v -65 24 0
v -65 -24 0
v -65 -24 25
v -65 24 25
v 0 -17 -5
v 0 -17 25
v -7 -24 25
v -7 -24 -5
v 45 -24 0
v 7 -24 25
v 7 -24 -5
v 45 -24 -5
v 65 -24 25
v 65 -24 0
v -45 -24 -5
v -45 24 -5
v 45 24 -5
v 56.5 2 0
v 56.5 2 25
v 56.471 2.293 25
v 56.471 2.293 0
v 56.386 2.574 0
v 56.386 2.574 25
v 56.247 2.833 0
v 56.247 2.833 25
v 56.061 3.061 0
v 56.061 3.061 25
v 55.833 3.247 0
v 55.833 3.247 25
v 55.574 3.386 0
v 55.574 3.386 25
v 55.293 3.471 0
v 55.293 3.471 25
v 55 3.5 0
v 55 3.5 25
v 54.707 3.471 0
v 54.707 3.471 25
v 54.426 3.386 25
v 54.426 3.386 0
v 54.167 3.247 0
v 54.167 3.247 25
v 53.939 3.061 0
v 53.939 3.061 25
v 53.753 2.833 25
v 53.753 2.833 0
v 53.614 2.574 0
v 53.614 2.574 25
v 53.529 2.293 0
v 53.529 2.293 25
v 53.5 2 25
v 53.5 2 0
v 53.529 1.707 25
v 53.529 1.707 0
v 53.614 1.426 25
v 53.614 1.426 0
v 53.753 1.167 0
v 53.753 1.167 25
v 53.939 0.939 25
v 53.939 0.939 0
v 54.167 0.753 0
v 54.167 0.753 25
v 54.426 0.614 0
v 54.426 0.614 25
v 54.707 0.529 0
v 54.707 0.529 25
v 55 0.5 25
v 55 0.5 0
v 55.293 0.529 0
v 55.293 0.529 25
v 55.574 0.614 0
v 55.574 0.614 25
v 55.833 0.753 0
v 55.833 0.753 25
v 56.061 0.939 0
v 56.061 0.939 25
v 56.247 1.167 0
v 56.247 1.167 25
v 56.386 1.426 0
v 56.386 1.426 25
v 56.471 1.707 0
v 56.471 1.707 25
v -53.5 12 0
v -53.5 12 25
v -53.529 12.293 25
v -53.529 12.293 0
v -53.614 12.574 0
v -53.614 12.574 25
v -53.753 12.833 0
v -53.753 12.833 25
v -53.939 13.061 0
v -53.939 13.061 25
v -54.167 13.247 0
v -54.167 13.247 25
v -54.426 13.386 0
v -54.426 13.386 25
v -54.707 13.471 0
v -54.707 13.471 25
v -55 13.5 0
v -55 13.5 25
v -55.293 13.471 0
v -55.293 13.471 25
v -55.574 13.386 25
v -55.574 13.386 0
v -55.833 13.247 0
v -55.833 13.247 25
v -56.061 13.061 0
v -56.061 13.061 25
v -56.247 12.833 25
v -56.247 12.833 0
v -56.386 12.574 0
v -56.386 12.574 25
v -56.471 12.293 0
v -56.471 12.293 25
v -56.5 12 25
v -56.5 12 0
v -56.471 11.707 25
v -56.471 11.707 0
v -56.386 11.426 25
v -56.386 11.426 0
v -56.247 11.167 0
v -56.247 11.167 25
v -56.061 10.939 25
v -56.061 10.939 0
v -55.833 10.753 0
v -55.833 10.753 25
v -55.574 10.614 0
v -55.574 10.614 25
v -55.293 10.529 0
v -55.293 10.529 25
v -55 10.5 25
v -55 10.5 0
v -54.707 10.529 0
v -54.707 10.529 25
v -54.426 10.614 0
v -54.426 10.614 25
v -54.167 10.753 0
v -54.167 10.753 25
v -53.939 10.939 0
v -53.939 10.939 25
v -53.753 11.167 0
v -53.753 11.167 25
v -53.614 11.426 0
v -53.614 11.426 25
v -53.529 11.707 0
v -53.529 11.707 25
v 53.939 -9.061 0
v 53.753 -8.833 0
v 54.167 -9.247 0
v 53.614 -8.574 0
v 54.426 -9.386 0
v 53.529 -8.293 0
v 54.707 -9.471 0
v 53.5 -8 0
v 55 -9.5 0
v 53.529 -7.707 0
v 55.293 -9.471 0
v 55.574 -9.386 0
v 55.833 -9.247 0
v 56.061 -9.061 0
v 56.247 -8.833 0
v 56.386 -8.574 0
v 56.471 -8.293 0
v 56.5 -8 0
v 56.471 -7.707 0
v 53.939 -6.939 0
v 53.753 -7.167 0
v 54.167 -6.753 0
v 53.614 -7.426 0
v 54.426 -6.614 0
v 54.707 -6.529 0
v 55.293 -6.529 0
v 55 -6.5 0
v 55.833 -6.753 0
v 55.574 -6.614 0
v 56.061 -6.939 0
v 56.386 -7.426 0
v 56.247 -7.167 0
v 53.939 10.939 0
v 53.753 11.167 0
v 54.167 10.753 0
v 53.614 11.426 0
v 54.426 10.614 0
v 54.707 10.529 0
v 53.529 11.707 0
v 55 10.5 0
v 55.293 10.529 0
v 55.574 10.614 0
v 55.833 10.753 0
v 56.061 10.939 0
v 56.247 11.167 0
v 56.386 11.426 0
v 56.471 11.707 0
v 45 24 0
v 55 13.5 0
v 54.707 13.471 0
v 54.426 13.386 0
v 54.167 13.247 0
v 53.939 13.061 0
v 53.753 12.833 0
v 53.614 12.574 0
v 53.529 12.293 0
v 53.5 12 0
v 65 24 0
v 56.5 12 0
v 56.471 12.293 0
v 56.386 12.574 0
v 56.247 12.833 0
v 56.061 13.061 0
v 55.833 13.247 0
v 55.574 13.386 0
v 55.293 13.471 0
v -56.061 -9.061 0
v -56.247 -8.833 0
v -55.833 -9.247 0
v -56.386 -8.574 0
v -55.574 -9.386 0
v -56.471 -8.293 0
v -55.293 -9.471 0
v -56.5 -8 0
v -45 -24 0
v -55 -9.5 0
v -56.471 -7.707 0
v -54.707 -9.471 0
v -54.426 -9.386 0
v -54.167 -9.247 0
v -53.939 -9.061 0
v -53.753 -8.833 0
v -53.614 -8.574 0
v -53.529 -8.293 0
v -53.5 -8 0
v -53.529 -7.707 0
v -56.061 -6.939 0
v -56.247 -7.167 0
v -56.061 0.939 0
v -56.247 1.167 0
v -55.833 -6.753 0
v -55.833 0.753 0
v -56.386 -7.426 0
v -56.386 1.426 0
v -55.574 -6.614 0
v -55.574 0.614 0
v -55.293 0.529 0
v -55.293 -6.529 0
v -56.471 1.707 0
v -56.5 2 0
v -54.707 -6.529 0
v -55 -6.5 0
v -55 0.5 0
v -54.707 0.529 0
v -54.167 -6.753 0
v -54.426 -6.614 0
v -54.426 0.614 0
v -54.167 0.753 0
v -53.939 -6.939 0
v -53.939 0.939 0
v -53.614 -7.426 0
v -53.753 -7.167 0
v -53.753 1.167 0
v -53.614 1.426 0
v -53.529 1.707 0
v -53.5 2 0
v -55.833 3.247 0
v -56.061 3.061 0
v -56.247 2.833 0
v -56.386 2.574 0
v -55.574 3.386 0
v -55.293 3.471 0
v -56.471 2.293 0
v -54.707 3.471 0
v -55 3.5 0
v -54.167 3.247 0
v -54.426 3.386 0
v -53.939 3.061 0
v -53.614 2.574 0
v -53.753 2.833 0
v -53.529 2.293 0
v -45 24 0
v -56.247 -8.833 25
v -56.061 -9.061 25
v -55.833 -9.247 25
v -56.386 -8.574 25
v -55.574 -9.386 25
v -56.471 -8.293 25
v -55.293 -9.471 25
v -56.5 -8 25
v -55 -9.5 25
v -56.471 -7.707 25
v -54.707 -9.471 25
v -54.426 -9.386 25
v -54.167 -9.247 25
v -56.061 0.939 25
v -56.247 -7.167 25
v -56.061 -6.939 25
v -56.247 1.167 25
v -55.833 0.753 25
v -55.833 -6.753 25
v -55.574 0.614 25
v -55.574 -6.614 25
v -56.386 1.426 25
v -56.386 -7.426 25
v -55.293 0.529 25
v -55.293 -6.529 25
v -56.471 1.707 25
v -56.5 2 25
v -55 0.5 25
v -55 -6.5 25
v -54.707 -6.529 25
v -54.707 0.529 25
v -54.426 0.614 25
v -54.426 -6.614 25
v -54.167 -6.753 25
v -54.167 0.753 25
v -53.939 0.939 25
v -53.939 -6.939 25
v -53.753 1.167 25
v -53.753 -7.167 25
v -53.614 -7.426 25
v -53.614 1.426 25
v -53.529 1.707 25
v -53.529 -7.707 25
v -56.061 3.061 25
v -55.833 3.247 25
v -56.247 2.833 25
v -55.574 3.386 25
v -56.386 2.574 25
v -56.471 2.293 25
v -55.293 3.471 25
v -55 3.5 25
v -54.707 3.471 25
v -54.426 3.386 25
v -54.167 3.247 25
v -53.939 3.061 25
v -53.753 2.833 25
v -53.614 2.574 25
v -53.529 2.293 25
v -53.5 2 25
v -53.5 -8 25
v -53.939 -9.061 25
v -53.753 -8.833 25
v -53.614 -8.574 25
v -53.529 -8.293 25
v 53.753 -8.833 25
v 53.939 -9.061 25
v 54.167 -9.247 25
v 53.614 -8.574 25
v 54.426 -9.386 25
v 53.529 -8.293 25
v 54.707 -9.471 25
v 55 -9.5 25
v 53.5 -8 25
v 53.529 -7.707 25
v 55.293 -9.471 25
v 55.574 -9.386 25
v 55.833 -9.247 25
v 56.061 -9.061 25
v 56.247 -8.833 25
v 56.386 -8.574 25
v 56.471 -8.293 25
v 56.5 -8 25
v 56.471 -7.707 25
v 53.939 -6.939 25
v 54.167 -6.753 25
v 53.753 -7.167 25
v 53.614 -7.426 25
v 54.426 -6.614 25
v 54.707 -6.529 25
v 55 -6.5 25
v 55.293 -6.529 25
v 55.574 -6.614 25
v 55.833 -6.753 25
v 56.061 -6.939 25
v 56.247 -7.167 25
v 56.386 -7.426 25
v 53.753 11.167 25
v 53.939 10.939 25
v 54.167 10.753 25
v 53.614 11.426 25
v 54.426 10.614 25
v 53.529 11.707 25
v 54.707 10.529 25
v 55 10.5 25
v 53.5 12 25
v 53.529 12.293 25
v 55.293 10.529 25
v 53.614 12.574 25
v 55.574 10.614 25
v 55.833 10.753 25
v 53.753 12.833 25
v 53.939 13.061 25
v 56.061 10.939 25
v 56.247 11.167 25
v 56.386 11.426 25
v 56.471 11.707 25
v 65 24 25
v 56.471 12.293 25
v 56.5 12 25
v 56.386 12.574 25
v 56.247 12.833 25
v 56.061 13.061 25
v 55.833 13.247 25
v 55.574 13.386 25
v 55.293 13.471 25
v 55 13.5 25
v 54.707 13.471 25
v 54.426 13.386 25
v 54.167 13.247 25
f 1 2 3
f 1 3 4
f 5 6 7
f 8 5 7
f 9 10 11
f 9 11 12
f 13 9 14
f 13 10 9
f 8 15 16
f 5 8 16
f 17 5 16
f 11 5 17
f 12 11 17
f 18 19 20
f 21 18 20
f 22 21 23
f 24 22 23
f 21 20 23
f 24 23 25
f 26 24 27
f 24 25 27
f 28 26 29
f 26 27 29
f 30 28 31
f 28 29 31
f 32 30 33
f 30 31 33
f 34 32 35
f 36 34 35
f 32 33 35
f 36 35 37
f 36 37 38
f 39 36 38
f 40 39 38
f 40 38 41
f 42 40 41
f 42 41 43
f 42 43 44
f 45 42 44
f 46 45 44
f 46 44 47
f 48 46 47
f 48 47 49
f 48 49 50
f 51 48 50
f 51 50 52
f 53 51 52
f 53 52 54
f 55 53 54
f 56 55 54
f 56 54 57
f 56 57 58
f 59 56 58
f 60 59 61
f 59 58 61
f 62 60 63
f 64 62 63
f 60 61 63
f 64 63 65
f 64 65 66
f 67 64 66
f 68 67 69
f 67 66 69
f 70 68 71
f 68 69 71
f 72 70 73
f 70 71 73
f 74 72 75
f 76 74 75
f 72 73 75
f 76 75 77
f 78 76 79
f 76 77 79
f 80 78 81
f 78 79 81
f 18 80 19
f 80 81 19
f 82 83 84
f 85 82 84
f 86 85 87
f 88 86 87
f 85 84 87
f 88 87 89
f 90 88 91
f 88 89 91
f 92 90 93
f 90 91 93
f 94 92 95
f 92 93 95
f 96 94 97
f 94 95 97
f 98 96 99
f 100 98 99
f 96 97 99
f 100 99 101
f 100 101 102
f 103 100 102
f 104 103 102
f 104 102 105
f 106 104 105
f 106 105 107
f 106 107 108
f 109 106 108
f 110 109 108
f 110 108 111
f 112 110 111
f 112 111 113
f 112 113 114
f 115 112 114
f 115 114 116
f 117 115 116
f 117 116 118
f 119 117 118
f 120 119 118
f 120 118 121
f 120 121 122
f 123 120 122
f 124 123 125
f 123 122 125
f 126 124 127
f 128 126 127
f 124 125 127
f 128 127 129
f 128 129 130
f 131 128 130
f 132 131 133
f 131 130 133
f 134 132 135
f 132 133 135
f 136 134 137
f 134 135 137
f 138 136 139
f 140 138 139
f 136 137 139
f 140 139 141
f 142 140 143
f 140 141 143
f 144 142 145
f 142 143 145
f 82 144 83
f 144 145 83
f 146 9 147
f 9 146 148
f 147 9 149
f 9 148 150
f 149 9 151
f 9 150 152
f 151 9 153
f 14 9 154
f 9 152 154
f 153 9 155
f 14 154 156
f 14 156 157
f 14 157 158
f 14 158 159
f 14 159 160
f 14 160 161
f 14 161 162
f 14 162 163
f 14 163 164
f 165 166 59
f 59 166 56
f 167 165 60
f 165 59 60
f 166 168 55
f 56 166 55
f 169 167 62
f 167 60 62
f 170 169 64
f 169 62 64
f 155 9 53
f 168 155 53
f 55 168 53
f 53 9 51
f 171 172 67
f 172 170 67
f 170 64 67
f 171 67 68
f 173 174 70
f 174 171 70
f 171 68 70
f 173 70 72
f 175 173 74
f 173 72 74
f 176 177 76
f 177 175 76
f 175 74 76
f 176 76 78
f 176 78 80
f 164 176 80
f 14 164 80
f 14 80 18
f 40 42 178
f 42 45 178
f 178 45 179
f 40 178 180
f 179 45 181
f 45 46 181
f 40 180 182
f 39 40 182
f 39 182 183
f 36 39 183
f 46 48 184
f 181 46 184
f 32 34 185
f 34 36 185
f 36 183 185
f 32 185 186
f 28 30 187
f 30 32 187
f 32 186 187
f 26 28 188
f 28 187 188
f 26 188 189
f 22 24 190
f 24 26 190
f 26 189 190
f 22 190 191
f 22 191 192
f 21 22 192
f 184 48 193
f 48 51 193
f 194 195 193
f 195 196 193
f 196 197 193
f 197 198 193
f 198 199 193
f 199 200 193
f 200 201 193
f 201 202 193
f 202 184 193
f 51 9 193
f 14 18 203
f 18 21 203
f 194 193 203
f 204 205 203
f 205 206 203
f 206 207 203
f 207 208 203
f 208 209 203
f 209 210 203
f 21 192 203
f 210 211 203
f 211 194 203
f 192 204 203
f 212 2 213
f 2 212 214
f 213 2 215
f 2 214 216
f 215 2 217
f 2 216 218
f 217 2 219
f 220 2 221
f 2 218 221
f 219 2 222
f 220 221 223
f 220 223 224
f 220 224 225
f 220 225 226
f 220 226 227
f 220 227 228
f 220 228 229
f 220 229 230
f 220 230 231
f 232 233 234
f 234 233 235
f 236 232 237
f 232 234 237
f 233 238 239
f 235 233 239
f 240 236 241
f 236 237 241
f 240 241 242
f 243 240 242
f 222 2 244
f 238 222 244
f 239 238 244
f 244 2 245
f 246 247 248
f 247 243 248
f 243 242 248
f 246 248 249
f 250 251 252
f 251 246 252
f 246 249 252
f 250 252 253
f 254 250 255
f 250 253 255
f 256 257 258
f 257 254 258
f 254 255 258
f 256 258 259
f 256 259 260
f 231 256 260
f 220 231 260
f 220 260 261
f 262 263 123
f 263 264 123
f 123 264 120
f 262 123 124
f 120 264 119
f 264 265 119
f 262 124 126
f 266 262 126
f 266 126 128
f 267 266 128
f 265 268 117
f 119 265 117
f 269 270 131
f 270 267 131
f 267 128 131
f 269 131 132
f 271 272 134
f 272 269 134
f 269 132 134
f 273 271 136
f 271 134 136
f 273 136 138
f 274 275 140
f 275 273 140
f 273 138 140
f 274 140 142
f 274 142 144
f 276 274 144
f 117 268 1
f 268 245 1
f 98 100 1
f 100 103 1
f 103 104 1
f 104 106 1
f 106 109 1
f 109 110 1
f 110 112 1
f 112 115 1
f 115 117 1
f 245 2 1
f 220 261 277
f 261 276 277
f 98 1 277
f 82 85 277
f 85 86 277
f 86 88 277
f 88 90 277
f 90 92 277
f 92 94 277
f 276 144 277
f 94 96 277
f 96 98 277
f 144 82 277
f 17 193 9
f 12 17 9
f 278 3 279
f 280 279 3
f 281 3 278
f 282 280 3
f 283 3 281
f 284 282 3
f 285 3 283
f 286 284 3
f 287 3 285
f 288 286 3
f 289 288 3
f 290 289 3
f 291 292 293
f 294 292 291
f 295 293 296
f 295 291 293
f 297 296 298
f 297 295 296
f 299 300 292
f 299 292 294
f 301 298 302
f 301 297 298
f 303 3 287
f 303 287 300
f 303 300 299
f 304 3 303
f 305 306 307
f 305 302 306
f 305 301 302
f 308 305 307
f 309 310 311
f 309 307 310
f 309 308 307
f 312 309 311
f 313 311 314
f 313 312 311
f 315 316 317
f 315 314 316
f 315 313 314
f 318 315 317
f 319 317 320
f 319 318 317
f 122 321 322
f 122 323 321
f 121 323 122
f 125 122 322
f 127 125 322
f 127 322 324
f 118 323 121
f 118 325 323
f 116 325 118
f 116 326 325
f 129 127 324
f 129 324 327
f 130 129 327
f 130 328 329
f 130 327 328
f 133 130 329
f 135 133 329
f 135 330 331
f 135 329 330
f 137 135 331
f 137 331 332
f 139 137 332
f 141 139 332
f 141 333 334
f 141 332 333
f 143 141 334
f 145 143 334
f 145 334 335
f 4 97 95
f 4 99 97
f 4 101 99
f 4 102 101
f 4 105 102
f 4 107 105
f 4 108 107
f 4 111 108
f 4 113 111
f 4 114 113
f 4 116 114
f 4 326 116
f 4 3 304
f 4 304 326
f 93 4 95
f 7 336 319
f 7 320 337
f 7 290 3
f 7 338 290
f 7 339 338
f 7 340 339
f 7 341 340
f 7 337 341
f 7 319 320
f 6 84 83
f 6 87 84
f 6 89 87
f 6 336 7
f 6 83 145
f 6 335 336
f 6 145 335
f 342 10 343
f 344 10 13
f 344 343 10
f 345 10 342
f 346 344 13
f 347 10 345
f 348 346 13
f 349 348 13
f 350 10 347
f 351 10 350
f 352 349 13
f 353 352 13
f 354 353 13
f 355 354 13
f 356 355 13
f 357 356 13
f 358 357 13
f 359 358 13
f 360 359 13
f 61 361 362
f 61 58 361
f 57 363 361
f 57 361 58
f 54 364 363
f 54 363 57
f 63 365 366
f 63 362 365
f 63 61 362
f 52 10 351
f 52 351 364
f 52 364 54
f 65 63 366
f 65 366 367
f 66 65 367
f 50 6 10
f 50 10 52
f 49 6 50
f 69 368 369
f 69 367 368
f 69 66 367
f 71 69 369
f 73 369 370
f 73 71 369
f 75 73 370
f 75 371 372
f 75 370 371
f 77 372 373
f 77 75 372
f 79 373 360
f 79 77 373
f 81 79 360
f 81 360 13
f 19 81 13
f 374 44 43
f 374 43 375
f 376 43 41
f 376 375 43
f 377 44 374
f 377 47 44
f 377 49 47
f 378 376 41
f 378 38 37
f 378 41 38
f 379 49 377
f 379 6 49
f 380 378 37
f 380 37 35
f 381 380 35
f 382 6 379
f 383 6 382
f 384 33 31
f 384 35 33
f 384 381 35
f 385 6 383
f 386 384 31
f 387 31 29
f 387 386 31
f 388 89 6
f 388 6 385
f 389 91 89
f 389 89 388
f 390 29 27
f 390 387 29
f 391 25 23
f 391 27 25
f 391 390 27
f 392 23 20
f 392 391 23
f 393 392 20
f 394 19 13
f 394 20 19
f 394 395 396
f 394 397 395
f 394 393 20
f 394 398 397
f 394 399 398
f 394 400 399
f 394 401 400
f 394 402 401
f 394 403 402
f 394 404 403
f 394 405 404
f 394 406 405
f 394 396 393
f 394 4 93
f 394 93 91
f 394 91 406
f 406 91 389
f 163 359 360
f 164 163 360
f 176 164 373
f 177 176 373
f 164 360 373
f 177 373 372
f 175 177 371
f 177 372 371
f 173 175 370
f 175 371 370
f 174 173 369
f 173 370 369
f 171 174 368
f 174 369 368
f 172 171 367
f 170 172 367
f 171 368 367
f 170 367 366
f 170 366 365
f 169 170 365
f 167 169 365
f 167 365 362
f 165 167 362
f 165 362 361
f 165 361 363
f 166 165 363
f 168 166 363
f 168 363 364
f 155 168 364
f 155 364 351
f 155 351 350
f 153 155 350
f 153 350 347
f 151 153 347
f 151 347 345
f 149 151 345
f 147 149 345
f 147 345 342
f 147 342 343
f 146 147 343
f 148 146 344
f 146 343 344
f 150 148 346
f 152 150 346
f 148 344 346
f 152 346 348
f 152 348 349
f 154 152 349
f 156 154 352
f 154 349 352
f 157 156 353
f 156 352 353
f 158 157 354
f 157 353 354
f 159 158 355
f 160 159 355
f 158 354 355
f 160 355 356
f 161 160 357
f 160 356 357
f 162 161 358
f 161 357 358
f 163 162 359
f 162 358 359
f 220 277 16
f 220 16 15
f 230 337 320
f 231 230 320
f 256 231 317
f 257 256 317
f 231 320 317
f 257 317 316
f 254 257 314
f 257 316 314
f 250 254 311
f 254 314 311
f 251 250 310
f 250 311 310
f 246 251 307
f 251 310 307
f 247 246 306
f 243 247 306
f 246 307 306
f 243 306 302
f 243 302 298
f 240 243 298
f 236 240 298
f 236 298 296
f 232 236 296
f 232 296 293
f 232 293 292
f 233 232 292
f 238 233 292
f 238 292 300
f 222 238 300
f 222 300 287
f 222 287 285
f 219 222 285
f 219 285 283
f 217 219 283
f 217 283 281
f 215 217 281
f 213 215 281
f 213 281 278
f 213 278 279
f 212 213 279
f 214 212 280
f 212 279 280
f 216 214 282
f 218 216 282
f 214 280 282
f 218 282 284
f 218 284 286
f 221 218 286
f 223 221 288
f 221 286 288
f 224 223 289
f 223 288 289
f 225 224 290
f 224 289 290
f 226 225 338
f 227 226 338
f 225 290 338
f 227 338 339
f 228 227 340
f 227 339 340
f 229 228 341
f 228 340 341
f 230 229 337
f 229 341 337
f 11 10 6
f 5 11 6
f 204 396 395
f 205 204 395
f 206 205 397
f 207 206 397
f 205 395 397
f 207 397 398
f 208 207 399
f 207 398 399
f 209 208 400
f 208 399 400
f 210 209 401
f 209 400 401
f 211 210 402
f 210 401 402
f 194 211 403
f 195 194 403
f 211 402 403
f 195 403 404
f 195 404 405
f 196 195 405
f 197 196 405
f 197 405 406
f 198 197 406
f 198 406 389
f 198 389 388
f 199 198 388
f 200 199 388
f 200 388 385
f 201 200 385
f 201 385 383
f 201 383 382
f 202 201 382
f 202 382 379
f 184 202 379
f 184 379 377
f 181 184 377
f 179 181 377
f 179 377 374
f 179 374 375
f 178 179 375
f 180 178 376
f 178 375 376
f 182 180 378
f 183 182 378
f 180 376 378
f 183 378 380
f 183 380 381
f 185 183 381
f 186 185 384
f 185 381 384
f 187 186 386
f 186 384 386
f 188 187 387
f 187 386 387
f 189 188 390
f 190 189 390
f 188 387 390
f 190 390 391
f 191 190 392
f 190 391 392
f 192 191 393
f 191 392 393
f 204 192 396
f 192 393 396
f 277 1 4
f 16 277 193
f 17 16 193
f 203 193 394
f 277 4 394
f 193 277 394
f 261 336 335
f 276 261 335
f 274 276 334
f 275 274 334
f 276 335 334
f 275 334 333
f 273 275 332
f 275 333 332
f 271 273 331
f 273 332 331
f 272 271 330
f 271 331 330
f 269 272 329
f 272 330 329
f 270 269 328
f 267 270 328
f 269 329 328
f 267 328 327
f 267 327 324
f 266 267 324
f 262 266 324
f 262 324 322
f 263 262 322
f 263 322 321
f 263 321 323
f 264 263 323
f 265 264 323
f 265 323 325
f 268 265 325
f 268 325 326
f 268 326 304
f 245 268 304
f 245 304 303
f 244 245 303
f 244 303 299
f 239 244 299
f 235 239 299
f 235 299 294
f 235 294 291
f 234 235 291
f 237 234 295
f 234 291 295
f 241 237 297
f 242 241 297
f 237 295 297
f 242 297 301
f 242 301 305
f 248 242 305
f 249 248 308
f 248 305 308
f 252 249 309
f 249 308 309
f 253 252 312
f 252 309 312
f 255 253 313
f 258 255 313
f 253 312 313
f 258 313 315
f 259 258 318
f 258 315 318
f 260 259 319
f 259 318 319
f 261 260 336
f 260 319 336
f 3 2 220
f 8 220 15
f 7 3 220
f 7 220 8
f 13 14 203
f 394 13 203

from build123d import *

# Parameters (mm, degrees)
F0_W     = 130
F0_H     = 48
F1_DEPTH = 25
F3_DEPTH = 25.001
F4_R     = 1.5
F5_DEPTH = 25.001
F6_W     = 90
F6_H     = 48
F7_DEPTH = 5
F8_DEPTH = 25


with BuildPart() as f1:
    # F0 (on Top) → F1 (new body)
    with BuildSketch(Plane.XY):
        Rectangle(F0_W, F0_H)
    extrude(amount=F1_DEPTH)

    # F2 (on face) → F3 (cut, through all)
    with BuildSketch(Plane.XY.offset(25)):
        Polygon((7, -24), (0, -17), (-7, -24), align=None)
    extrude(amount=-F3_DEPTH, mode=Mode.SUBTRACT)

    # F4 (on face) → F5 (cut, through all)
    with BuildSketch(Plane.XY.offset(25)):
        with Locations((-55, 12)):
            Circle(F4_R)
        with Locations((-55, 2)):
            Circle(F4_R)
        with Locations((-55, -8)):
            Circle(F4_R)
        with Locations((55, 12)):
            Circle(F4_R)
        with Locations((55, 2)):
            Circle(F4_R)
        with Locations((55, -8)):
            Circle(F4_R)
    extrude(amount=-F5_DEPTH, mode=Mode.SUBTRACT)

    # F6 (on face) → F7 (join)
    with BuildSketch(Plane(origin=(0, 0, 0), x_dir=(1, 0, 0), z_dir=(0, 0, -1))):
        Rectangle(F6_W, F6_H)
    extrude(amount=F7_DEPTH)

    # F8 (cut): a face of the model
    f8_faces = [f1.faces().sort_by_distance(p)[0] for p in [
        (0, -21.6666666667, 0),
    ]]
    extrude(f8_faces, amount=-F8_DEPTH, mode=Mode.SUBTRACT)


solid = f1.part
